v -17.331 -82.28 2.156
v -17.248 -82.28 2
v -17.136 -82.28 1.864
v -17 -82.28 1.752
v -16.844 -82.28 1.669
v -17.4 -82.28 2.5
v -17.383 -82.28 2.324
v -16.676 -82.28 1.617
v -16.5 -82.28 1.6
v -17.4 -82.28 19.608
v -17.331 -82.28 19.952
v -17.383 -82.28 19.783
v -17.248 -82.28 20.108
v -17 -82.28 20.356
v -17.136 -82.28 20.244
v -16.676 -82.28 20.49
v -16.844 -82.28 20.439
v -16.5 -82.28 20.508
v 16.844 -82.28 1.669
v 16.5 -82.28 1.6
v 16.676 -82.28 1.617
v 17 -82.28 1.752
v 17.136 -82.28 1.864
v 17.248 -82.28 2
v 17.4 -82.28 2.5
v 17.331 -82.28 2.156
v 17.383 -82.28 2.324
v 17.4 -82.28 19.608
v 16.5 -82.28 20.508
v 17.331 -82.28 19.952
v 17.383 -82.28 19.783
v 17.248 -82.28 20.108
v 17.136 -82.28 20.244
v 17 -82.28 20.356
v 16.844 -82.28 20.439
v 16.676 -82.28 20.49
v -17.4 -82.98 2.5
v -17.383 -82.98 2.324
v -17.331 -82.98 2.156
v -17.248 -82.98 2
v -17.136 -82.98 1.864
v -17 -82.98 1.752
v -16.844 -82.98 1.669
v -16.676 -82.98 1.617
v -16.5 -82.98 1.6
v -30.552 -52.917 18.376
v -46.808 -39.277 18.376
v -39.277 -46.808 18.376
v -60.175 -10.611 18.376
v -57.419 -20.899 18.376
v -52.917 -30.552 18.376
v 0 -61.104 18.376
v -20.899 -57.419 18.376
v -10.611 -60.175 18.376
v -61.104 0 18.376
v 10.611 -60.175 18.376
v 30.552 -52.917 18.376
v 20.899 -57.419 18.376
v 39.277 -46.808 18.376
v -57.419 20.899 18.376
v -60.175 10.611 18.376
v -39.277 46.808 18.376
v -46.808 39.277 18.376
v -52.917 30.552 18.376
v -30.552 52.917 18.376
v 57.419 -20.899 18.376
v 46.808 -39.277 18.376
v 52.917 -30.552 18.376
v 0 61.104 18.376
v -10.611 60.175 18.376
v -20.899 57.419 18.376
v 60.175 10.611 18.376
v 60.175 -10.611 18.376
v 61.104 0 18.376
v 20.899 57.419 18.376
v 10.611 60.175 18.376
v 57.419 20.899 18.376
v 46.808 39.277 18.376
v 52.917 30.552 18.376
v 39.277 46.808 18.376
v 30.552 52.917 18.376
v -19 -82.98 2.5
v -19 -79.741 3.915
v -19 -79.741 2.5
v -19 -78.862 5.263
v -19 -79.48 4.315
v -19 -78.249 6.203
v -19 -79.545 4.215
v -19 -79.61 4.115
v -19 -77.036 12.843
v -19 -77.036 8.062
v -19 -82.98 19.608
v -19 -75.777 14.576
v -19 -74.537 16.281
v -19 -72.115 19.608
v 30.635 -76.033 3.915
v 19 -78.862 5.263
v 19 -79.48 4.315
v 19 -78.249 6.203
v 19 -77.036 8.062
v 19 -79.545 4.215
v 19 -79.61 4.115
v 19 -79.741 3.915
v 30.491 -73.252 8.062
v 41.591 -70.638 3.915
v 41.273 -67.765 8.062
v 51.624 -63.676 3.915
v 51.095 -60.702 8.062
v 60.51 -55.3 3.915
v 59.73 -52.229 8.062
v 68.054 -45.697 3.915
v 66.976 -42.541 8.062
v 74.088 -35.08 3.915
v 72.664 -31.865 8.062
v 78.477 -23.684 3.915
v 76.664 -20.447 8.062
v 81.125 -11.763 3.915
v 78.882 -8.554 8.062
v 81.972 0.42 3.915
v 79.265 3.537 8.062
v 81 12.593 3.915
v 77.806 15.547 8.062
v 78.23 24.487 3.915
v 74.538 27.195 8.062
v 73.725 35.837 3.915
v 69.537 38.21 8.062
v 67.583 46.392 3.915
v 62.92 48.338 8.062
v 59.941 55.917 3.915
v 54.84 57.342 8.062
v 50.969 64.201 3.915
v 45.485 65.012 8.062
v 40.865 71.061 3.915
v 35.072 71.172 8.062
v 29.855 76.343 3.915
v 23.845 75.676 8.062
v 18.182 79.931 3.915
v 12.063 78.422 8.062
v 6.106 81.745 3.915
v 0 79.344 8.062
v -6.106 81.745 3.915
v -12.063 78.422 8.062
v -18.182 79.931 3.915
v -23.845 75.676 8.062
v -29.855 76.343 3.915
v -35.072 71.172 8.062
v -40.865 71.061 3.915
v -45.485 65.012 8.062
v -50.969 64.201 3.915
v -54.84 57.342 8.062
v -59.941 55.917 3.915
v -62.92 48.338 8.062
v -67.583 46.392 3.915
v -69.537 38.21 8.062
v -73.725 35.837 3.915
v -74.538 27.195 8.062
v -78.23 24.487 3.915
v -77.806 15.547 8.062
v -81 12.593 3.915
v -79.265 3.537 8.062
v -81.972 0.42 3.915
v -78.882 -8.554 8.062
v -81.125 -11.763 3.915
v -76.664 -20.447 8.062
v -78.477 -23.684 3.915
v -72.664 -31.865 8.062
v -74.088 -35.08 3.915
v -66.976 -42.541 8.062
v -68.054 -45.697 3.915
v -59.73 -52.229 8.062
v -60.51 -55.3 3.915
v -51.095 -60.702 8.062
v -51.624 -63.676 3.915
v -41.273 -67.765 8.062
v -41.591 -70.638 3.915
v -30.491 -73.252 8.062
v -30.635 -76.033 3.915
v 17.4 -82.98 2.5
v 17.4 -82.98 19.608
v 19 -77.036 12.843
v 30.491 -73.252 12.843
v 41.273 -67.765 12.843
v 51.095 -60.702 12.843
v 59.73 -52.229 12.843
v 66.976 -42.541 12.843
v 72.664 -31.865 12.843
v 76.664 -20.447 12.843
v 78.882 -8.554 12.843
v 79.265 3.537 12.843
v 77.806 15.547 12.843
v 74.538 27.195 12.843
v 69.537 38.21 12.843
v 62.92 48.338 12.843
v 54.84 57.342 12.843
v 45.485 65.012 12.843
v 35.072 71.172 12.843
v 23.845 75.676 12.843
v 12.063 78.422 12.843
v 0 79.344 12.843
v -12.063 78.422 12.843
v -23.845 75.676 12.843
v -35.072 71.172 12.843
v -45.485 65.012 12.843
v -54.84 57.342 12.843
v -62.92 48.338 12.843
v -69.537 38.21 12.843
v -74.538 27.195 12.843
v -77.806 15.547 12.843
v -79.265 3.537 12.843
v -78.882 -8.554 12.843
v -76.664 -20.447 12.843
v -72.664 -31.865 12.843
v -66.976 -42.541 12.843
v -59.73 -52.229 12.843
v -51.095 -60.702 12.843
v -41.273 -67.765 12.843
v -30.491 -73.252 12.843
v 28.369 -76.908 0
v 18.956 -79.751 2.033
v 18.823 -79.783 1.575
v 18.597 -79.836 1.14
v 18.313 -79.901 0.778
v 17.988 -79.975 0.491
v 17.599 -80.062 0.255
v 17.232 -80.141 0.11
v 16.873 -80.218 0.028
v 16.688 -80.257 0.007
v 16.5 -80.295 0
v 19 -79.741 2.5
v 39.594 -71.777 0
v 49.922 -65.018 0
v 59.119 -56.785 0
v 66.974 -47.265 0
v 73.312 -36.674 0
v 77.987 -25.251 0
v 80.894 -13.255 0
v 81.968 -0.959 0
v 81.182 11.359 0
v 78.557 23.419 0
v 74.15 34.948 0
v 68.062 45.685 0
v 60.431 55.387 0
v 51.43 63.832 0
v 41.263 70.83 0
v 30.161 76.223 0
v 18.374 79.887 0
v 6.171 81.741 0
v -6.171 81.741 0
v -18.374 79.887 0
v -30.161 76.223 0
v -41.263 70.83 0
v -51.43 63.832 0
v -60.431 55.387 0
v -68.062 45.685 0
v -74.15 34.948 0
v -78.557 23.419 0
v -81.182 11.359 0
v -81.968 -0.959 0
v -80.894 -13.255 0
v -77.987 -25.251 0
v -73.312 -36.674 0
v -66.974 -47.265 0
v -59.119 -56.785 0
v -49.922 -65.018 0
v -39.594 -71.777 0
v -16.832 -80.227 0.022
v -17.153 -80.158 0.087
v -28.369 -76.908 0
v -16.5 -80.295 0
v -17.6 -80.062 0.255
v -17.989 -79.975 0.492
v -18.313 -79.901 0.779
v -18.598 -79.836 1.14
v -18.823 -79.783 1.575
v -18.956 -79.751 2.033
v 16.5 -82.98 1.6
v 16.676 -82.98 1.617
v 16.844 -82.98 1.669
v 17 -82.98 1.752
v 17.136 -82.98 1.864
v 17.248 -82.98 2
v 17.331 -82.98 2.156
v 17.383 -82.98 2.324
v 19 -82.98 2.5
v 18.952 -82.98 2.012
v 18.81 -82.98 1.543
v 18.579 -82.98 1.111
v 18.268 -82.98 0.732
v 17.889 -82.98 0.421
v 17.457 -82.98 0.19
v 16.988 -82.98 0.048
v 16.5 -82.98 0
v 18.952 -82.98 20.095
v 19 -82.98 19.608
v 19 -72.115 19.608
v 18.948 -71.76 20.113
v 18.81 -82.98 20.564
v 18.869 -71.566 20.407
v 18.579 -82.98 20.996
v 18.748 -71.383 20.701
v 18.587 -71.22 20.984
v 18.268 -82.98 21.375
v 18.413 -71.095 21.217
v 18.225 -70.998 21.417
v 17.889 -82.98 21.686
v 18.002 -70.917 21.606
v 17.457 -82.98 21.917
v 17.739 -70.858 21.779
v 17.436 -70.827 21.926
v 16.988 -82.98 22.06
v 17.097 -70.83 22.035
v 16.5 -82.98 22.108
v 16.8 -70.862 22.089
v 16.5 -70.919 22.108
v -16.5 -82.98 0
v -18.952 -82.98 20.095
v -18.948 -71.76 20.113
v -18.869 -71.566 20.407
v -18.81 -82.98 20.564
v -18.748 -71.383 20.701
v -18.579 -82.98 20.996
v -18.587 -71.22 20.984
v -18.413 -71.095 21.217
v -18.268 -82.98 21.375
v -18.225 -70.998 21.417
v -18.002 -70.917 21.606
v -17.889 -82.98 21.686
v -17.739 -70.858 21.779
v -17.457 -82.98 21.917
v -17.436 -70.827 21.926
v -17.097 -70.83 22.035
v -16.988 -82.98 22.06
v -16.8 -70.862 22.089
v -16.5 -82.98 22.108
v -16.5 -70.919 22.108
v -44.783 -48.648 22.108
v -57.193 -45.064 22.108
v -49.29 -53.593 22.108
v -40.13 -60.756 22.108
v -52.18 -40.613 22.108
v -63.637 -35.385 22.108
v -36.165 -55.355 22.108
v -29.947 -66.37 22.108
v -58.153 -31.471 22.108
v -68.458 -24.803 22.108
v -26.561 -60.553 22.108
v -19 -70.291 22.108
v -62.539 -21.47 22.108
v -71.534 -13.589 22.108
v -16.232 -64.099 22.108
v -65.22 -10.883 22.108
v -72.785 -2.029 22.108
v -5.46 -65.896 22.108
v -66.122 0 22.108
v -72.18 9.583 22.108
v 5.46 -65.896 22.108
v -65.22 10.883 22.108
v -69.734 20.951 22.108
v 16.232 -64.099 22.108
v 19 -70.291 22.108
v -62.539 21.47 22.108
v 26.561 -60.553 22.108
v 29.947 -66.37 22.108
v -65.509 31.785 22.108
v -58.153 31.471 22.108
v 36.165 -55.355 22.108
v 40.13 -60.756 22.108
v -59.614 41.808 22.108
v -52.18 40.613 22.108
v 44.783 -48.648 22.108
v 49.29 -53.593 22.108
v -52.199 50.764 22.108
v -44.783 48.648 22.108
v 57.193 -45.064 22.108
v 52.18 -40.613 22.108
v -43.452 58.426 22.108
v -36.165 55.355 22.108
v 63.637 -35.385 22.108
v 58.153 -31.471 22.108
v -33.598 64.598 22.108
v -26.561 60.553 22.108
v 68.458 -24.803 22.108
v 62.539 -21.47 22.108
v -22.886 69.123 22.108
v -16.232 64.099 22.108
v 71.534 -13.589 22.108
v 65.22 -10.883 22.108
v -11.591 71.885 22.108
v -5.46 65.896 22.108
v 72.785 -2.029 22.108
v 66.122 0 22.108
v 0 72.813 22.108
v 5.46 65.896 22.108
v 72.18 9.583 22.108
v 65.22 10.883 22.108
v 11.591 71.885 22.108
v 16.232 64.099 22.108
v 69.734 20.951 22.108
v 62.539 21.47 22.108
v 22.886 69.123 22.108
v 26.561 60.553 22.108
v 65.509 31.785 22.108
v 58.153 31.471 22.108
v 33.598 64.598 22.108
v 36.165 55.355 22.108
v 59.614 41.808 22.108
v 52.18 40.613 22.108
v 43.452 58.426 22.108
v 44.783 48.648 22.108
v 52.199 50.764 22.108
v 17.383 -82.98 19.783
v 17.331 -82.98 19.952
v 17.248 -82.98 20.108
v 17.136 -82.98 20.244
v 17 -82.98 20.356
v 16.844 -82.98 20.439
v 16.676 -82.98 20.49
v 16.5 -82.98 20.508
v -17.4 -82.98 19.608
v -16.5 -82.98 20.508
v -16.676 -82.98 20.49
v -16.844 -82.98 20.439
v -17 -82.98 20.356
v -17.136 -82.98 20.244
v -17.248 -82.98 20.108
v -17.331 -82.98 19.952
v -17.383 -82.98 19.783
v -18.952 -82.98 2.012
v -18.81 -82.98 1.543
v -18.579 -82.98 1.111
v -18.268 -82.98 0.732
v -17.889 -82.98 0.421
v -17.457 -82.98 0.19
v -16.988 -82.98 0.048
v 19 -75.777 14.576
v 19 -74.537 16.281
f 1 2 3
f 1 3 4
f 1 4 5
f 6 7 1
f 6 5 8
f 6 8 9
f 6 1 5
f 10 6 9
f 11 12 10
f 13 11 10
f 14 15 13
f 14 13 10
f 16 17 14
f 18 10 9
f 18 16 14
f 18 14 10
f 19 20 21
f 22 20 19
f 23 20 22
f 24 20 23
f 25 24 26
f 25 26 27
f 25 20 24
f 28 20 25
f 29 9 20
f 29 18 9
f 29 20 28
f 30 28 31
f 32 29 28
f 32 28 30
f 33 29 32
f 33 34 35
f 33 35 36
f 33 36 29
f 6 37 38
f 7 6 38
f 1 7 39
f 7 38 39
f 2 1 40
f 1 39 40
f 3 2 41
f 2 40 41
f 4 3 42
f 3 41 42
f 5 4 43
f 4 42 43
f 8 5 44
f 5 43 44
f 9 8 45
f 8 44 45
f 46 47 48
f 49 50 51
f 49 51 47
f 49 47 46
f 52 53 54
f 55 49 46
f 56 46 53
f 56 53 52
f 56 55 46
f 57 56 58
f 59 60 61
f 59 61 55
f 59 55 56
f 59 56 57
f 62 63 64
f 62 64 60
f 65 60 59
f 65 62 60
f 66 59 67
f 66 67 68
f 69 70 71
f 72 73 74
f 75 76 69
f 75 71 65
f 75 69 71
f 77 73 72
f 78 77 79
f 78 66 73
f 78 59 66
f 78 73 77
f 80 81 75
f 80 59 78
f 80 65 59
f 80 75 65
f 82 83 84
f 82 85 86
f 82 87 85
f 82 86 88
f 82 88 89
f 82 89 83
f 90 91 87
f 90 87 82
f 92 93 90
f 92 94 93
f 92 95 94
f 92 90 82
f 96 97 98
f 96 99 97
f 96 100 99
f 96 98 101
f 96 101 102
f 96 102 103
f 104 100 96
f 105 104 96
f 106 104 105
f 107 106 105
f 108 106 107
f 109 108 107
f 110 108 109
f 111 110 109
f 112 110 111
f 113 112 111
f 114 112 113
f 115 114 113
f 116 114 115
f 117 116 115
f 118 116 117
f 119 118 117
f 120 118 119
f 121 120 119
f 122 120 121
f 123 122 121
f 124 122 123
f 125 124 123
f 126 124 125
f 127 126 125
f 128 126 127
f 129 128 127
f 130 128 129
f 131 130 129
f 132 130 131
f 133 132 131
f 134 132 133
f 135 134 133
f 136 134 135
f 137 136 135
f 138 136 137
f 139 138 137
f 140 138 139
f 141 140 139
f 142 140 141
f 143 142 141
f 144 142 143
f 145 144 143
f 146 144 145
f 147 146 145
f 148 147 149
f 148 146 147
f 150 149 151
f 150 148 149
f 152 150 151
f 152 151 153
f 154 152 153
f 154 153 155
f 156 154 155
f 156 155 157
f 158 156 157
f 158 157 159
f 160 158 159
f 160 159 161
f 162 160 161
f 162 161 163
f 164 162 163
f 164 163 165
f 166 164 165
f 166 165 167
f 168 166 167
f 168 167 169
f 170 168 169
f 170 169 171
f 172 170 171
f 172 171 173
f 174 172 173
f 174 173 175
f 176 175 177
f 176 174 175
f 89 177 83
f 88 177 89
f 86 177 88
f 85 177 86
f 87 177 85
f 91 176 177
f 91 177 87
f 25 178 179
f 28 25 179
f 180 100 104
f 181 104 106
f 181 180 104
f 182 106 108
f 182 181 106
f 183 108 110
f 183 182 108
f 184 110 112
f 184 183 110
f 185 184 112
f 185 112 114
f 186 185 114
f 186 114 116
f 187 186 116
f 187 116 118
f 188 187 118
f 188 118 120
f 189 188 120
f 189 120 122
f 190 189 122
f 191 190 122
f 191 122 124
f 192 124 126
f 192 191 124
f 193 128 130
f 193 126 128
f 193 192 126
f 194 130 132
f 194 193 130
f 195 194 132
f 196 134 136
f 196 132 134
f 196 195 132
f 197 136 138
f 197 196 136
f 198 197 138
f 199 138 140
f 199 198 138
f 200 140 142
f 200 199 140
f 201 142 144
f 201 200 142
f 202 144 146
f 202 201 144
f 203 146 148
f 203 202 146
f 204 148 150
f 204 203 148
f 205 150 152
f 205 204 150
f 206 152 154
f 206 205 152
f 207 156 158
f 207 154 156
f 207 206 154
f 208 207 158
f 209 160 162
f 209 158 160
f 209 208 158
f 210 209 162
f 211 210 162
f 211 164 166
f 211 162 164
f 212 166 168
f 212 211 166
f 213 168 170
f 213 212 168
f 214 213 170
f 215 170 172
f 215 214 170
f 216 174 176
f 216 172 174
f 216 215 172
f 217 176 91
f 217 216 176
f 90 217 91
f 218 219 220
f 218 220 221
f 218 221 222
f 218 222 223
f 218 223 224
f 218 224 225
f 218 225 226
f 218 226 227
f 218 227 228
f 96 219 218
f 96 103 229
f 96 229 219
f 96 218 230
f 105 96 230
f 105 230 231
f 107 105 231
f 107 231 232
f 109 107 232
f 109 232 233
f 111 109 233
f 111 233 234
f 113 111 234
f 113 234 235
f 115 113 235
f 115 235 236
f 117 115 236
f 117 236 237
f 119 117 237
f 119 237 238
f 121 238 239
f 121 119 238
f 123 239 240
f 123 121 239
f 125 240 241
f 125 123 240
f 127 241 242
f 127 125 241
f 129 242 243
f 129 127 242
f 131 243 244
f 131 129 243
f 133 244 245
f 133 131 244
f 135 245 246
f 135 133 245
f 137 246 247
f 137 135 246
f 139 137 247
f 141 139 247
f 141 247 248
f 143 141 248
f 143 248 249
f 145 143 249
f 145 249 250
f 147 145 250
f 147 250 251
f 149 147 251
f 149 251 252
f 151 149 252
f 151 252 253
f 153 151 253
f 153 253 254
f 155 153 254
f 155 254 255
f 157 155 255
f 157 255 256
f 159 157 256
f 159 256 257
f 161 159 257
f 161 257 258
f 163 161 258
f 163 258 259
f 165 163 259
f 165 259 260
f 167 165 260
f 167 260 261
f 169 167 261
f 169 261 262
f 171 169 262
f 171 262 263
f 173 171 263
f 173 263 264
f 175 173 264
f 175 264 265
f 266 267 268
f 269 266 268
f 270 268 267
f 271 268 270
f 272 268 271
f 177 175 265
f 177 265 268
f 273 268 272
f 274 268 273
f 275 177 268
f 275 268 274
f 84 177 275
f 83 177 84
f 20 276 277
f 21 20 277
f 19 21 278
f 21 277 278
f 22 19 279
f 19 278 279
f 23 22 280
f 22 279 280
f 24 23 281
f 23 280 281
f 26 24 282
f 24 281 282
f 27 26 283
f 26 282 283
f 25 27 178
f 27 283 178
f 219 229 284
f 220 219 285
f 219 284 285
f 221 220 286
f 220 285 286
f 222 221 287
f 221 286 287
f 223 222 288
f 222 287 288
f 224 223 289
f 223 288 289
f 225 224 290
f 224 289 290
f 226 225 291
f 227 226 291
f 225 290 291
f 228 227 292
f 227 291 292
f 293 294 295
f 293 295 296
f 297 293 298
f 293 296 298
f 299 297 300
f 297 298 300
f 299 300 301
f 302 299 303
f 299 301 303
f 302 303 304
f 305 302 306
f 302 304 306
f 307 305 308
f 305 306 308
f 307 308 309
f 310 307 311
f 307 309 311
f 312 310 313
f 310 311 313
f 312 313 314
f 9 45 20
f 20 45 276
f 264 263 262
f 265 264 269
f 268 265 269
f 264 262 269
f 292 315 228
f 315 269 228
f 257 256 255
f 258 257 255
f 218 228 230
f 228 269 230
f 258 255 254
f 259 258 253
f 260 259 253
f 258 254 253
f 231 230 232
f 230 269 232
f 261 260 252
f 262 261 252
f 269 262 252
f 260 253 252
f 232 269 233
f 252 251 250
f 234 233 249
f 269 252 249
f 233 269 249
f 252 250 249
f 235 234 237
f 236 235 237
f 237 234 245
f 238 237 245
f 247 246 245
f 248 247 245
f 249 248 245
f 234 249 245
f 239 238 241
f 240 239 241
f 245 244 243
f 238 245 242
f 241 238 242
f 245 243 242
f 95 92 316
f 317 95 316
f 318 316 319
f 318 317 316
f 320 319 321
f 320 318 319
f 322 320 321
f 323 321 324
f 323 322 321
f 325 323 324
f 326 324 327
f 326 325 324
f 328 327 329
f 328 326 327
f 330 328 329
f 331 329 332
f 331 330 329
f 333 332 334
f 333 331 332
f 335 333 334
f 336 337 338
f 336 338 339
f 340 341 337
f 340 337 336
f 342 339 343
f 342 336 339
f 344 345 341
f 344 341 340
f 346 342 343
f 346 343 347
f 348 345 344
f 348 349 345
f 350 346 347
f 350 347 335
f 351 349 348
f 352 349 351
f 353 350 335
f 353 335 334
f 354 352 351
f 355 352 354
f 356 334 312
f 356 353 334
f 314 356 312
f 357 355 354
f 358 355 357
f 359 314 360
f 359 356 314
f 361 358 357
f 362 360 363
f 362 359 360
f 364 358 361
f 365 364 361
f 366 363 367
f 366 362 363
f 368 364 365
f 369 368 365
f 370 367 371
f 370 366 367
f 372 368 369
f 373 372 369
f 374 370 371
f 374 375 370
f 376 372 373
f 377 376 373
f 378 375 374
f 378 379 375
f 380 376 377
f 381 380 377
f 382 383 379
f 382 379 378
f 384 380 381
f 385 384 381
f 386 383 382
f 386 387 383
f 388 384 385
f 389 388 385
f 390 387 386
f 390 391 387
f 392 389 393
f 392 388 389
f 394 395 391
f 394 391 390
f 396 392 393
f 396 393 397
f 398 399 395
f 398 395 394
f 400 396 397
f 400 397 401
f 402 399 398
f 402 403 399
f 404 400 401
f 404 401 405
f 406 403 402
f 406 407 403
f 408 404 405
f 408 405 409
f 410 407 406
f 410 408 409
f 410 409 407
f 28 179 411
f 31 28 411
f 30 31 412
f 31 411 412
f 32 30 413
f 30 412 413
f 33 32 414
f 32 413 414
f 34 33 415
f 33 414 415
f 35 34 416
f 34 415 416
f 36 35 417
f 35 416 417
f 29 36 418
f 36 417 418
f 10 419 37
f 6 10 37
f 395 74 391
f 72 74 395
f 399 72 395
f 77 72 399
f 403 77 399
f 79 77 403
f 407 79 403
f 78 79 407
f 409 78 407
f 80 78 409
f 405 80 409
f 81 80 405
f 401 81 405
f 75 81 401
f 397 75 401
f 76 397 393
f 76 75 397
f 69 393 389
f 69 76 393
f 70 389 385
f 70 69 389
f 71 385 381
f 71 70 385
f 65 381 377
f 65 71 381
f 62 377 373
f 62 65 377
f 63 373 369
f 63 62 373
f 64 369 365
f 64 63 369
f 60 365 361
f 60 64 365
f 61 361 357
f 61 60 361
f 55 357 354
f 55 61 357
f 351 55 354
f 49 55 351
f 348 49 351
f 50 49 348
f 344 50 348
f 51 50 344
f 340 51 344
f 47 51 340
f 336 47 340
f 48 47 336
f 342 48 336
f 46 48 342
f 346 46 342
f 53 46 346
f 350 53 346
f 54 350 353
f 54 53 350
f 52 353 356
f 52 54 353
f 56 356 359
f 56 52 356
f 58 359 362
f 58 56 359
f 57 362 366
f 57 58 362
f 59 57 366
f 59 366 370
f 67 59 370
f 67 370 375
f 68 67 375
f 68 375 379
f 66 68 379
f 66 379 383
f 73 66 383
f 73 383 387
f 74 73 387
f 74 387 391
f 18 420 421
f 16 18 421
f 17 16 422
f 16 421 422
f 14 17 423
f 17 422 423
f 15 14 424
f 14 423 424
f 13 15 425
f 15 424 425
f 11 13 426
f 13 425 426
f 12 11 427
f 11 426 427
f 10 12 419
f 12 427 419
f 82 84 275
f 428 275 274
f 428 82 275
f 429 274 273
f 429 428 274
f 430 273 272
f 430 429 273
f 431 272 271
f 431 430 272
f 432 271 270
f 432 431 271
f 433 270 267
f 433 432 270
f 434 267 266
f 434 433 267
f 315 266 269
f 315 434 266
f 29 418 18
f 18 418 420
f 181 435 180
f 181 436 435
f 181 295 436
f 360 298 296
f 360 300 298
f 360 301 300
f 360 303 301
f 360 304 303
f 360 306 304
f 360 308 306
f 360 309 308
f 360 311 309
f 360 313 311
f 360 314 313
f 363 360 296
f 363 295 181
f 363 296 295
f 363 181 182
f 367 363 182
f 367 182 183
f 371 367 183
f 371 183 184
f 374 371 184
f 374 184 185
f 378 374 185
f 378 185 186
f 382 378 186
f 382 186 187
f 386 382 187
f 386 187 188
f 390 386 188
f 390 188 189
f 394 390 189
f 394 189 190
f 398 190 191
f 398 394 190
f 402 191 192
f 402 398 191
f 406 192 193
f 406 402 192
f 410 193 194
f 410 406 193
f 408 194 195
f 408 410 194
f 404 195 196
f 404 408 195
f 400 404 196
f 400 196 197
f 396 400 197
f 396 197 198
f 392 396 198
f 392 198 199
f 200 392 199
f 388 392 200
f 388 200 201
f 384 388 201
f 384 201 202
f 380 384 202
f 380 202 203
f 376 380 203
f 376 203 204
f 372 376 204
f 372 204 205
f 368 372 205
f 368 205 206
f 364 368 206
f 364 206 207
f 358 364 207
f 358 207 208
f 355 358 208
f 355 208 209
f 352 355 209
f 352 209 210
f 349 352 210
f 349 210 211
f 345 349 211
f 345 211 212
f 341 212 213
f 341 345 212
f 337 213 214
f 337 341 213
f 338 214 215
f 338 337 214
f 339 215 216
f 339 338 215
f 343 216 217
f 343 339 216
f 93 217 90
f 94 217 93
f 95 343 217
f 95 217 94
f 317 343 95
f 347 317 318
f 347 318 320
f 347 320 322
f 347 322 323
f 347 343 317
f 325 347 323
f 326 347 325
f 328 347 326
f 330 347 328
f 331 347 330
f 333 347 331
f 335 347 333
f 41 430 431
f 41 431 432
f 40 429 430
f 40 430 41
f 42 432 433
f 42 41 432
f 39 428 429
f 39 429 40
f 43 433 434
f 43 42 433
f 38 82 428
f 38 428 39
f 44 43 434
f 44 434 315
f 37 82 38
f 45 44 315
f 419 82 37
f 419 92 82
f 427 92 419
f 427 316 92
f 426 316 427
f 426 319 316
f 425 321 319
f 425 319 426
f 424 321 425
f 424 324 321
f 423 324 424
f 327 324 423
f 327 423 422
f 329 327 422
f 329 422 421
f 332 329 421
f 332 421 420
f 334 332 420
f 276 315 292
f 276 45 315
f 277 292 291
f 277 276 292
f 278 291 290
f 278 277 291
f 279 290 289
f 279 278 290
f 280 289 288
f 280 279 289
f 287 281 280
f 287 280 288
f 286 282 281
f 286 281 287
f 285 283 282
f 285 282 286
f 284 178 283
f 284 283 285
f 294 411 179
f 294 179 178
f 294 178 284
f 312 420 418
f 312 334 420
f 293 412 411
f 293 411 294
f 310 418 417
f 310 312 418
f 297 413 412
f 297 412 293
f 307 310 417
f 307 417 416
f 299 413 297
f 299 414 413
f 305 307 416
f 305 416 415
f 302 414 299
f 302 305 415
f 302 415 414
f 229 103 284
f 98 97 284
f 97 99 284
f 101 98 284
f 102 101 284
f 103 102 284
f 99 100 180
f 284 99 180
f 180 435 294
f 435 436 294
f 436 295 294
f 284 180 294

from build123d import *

# Parameters (mm, degrees)
F3_W     = 38
F3_H     = 19.3329955554
F4_DEPTH = 12.3
F5_DEPTH = 3.5
F6_DEPTH = 2.7745664948
F7_R     = 2.5
F9_DEPTH = 0.7


with BuildPart() as f1:
    # F0 (on Front) → F1 (revolve)
    with BuildSketch(Plane.XZ):
        Polygon((0, 18.3759443462), (0, 0), (81.9731503725, 0), (81.9731503725, 3.9145960473), (79.3440267444, 8.0617284402), (79.3440267444, 12.8429912047), (72.8131681681, 22.1075620502), (66.1219879985, 22.1075620502), (61.1036121845, 18.3759443462), align=None)
    revolve(axis=Axis((0, 0, 9.1879721731), (0, 0, 1)))

    # F3 (on offset) → F4 (join)
    with BuildSketch(Plane.XZ.offset(79.48)):
        with Locations((0, 12.4410642725)):
            Rectangle(F3_W, F3_H)
    extrude(amount=-F4_DEPTH)

    # F3 (on offset) → F5 (join)
    with BuildSketch(Plane.XZ.offset(79.48)):
        with Locations((0, 12.4410642725)):
            Rectangle(F3_W, F3_H)
    extrude(amount=F5_DEPTH)

    # F6 (add, through all): a face of the model
    f6_faces = [f1.faces().sort_by_distance(p)[0] for p in [
        (0, -81.9802862149, 2.7745664948),
    ]]
    extrude(f6_faces, amount=F6_DEPTH)

    # F7
    f7_edges = [f1.edges().sort_by_distance(p)[0] for p in [
        (-19, -76.635261, 22.107562),
        (19, -76.635261, 22.107562),
        (19, -81.360407, 0),
        (-19, -81.360407, 0),
    ]]
    fillet(f7_edges, radius=F7_R)

    # F8 (on face) → F9 (cut)
    with BuildSketch(Plane.XZ.offset(82.98)):
        with BuildLine():
            Line((16.5, 20.5075629056), (-16.5, 20.5075629056))
            ThreePointArc((-16.5, 20.5075629056), (-17.1363967079, 20.2439587581), (-17.4000008553, 19.6075620502))
            Line((-17.4000008553, 19.6075620502), (-17.4000008553, 2.5))
            ThreePointArc((-17.4000008553, 2.5), (-17.1363967079, 1.8636032921), (-16.5, 1.5999991447))
            Line((-16.5, 1.5999991447), (16.5, 1.5999991447))
            ThreePointArc((16.5, 1.5999991447), (17.1363967079, 1.8636032921), (17.4000008553, 2.5))
            Line((17.4000008553, 2.5), (17.4000008553, 19.6075620502))
            ThreePointArc((17.4000008553, 19.6075620502), (17.1363967079, 20.2439587581), (16.5, 20.5075629056))
        make_face()
    extrude(amount=-F9_DEPTH, mode=Mode.SUBTRACT)


solid = f1.part
